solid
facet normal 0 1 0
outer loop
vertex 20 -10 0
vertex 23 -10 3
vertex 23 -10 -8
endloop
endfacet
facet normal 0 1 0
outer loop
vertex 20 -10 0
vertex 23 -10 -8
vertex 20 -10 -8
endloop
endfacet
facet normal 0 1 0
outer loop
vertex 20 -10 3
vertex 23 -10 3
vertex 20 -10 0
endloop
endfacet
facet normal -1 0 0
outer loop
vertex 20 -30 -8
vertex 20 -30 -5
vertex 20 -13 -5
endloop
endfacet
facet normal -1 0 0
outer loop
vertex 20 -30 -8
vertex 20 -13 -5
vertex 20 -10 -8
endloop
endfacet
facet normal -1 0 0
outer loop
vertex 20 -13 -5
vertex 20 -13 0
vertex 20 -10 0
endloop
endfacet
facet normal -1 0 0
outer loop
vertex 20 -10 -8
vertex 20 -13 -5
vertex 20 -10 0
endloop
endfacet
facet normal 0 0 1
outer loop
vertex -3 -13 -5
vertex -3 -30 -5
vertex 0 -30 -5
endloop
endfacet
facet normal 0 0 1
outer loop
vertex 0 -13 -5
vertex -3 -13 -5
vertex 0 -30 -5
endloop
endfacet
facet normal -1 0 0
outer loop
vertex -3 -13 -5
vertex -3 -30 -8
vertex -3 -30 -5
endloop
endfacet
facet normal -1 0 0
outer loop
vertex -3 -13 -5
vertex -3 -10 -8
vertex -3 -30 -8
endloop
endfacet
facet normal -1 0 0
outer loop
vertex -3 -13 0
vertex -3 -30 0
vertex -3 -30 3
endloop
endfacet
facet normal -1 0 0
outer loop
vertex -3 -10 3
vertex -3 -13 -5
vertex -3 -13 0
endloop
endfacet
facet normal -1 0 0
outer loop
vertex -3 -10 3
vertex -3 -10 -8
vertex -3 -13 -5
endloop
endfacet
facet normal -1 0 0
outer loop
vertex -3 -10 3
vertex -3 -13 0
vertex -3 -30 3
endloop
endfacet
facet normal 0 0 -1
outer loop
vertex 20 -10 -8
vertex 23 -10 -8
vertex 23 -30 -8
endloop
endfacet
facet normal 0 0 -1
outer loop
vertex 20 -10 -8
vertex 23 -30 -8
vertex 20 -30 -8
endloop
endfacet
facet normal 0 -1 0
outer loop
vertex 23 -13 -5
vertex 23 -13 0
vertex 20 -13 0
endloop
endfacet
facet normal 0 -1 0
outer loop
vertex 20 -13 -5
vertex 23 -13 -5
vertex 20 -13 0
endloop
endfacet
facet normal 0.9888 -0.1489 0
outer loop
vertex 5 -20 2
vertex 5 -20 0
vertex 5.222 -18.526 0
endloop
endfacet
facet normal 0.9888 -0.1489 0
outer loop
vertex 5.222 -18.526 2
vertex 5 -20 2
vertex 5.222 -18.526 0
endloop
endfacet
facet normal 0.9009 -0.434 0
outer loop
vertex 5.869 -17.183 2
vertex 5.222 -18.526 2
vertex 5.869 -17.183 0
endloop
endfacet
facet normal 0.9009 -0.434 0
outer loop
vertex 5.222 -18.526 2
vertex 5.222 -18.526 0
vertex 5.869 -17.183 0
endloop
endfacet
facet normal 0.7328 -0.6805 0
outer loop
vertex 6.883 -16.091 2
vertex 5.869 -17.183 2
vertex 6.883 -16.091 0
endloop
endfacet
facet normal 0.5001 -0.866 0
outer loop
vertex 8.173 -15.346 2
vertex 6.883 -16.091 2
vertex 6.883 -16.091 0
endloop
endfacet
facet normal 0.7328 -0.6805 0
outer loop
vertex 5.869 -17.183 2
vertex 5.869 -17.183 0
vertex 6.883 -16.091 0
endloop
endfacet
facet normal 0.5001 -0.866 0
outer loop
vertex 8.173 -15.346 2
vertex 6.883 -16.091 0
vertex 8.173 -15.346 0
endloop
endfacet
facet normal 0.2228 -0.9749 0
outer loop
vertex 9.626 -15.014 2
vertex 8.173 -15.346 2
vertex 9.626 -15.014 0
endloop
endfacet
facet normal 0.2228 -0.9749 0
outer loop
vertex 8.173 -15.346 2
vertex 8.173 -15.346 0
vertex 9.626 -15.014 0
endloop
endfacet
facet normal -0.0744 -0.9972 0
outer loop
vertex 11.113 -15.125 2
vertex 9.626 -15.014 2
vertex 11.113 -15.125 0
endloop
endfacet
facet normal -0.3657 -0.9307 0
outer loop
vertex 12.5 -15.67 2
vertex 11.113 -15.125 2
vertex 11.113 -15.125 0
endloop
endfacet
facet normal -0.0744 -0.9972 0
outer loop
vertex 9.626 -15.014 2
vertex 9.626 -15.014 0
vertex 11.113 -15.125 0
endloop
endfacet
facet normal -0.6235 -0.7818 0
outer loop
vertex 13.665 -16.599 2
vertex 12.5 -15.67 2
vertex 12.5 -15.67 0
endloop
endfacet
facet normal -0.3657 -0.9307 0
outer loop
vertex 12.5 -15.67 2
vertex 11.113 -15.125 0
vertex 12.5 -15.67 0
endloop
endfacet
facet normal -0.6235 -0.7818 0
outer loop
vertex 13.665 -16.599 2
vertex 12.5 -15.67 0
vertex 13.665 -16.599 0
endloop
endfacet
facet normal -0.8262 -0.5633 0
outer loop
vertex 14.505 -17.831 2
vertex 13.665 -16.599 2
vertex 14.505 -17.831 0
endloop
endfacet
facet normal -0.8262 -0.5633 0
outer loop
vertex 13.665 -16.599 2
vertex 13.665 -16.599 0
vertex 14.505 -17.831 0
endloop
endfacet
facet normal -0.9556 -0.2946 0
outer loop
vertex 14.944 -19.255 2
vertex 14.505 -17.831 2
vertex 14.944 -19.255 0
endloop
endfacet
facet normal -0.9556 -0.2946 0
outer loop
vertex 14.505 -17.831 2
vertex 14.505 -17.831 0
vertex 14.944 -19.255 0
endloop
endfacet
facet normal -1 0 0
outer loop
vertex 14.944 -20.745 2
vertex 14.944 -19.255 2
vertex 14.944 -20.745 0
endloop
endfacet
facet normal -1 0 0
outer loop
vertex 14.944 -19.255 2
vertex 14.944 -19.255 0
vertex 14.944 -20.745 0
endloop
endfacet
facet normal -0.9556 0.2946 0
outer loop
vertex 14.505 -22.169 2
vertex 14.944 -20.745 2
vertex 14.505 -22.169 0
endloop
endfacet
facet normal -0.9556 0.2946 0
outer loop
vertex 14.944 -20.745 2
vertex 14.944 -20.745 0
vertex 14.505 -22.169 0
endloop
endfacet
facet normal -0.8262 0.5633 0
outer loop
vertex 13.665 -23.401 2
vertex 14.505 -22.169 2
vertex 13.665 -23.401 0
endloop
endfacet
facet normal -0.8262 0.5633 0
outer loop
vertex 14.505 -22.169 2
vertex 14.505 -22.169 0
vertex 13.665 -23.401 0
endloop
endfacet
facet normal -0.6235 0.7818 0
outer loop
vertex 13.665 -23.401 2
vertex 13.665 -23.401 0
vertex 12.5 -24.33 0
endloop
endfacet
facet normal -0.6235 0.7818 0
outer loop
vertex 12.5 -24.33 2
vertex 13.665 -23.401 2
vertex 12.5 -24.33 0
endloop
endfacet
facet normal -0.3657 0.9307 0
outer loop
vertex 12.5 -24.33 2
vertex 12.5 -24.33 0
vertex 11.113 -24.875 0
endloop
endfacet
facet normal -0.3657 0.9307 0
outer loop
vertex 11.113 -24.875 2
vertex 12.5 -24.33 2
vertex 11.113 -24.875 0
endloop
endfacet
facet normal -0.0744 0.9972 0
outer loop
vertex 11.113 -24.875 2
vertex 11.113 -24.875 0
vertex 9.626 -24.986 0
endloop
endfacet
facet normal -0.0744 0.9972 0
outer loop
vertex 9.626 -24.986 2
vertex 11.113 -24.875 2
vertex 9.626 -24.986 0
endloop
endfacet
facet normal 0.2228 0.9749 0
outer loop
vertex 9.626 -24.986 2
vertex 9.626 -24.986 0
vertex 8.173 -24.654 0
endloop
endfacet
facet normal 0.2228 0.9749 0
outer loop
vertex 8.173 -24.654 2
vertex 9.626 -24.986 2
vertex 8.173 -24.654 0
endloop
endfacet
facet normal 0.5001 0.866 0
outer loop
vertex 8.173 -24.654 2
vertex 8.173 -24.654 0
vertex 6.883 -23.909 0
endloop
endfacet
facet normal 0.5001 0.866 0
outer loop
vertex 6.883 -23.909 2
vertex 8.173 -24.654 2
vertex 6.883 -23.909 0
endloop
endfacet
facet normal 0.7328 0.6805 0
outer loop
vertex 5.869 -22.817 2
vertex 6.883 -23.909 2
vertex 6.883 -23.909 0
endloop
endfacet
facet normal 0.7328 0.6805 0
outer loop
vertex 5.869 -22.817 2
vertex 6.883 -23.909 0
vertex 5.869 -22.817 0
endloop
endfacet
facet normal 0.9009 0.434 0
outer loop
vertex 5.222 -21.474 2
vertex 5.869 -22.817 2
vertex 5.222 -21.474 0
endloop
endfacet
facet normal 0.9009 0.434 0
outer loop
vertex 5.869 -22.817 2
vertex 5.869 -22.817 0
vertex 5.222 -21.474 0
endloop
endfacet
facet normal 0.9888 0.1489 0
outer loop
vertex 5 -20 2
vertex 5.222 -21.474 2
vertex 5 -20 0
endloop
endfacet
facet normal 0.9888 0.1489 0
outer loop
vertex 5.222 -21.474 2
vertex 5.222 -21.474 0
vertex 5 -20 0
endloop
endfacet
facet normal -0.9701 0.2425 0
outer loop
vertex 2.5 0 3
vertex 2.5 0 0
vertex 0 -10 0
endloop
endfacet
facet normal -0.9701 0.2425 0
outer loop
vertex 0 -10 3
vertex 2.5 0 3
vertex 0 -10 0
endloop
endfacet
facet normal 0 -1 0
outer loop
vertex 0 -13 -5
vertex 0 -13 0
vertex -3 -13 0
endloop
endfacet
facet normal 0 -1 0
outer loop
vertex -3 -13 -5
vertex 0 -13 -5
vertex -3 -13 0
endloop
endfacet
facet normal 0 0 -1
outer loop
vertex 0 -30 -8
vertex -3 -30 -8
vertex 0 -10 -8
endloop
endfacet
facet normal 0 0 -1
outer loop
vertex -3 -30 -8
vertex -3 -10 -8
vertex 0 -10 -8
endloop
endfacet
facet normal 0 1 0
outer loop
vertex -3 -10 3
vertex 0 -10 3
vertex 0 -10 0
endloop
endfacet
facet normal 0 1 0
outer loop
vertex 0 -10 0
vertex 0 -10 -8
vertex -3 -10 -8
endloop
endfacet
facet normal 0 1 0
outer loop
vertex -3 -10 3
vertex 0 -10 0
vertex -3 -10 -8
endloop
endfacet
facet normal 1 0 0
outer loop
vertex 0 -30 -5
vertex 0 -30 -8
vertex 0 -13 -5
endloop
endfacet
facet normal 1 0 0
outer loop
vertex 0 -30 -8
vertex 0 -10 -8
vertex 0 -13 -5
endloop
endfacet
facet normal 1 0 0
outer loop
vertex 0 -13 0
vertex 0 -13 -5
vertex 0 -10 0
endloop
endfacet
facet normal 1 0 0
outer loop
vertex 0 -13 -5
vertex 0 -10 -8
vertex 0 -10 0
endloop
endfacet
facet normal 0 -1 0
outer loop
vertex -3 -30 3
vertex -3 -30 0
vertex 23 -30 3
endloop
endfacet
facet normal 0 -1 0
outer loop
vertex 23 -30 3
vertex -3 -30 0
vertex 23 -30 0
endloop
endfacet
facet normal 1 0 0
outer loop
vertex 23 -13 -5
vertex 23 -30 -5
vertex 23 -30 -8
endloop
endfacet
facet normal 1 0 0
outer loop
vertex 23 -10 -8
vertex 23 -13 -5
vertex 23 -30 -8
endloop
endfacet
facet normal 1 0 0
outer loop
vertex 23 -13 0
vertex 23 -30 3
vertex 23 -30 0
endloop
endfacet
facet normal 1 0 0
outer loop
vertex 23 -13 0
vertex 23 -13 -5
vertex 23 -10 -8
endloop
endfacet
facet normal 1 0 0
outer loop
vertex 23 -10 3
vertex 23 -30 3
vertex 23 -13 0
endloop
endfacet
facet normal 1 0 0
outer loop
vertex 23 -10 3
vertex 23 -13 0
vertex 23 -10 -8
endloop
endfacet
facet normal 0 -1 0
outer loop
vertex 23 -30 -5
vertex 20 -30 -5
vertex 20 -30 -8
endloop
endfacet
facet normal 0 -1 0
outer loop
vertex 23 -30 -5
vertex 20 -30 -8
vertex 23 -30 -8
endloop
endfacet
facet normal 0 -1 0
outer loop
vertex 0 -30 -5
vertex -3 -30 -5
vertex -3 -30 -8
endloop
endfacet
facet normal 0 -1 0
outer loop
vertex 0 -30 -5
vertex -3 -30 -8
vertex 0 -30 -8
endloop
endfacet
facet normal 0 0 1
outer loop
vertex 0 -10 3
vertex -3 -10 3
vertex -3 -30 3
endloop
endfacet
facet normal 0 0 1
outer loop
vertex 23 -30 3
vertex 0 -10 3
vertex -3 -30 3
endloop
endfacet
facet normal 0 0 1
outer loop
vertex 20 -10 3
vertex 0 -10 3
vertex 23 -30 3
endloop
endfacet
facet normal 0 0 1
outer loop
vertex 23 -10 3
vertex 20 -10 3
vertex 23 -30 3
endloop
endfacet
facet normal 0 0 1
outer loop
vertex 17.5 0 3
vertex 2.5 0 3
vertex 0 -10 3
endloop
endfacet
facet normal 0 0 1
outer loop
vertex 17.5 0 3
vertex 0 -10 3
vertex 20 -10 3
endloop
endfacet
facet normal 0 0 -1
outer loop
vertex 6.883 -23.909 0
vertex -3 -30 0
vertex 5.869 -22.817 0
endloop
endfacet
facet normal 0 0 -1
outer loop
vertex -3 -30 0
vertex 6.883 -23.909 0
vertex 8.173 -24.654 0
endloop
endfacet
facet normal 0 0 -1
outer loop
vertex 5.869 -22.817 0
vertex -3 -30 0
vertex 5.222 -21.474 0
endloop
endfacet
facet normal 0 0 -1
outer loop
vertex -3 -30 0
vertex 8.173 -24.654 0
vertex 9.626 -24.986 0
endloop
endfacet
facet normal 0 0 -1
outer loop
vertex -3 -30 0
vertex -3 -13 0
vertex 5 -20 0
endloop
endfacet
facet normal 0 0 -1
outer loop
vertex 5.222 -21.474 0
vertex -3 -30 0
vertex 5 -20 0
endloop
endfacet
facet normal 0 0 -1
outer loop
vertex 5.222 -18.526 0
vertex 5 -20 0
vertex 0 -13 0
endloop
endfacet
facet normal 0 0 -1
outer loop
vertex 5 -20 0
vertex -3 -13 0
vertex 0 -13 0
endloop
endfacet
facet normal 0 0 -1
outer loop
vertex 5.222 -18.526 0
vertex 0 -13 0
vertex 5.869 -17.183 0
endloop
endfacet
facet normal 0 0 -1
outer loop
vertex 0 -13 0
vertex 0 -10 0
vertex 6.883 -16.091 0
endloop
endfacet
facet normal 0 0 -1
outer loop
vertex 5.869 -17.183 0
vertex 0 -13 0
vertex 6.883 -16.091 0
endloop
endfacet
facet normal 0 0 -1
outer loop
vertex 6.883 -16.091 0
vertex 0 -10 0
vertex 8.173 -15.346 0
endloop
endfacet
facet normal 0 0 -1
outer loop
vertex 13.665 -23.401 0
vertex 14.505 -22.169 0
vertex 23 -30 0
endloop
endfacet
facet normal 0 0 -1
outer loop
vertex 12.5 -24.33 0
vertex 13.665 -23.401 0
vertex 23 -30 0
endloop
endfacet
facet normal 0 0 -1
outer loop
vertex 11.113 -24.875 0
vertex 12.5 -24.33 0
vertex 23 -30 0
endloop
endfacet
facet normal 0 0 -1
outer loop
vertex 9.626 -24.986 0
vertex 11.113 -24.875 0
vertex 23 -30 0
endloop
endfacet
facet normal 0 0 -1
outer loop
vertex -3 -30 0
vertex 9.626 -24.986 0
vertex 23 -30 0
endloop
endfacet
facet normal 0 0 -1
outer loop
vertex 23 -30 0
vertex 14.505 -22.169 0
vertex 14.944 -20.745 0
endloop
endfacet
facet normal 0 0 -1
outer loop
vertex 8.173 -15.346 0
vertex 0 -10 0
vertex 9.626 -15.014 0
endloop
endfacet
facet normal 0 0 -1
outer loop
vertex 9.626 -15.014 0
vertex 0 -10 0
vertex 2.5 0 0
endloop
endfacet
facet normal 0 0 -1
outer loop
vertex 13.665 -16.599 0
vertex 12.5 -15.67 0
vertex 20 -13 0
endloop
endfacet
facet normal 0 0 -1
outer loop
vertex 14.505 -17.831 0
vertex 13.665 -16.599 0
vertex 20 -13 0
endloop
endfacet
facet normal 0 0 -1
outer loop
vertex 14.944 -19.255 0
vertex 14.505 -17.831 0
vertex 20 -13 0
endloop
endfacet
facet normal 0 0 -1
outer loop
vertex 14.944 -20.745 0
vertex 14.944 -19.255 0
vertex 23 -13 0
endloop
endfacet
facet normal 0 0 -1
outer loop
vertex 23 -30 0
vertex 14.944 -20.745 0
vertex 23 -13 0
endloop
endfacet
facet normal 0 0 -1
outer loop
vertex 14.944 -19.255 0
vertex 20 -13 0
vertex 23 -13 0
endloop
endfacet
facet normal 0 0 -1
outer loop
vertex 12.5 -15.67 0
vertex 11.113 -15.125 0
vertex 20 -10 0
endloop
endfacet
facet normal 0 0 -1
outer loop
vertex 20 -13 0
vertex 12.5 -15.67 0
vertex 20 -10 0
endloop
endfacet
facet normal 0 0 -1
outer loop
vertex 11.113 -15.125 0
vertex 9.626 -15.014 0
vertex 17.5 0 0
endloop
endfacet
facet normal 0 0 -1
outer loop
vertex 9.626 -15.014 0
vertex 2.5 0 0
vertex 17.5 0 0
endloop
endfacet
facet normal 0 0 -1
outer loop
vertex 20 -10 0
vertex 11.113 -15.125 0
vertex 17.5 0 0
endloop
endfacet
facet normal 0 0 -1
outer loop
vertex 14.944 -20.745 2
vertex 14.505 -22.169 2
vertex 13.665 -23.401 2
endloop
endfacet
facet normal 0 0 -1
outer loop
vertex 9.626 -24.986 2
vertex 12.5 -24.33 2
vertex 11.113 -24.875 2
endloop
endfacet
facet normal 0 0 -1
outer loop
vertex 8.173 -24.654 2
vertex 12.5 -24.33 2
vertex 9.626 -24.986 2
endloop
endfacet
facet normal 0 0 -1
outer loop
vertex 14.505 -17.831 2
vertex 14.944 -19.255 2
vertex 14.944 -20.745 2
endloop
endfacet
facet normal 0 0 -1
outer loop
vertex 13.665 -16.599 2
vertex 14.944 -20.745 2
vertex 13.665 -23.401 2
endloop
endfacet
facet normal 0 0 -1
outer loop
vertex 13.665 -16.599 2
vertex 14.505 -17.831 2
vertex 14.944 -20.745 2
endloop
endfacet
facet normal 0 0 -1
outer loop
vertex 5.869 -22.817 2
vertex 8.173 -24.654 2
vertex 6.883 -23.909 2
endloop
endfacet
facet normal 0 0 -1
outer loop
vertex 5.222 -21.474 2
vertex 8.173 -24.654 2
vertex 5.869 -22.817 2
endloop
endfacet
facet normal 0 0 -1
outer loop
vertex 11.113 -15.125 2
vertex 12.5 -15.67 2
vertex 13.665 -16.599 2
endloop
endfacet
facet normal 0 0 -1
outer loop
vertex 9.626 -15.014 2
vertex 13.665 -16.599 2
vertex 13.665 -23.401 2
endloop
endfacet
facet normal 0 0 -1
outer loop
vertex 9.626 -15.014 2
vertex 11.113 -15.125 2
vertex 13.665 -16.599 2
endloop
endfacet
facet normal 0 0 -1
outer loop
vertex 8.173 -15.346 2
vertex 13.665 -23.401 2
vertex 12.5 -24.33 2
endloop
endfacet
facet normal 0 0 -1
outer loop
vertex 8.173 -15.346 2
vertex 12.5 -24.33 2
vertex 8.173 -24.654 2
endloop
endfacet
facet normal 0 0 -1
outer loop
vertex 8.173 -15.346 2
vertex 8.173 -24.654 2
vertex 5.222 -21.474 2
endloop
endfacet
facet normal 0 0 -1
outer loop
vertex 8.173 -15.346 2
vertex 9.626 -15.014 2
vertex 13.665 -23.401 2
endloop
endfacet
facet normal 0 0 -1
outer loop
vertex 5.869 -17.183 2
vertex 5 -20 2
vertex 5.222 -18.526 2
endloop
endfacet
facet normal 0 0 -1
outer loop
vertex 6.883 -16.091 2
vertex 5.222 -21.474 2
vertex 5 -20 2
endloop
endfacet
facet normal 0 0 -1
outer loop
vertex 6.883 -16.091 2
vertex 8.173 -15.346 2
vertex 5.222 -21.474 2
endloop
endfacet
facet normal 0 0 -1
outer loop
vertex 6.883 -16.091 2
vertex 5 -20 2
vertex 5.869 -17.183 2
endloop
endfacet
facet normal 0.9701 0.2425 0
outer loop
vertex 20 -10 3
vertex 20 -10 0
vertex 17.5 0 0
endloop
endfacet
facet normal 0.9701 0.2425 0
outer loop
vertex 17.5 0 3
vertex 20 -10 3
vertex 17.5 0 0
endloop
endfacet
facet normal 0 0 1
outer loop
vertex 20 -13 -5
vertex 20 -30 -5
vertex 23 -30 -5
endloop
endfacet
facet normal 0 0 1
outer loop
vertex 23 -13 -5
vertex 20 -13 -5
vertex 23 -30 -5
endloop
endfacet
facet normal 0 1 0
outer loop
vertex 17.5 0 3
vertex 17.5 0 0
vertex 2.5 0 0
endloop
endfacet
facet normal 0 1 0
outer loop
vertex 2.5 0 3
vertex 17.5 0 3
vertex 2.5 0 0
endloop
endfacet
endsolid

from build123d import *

# Parameters (mm, degrees)
EXTRUDE_1_DEPTH     = 3
SKETCH_4_W          = 3
SKETCH_4_H          = 3
EXTRUDE_2_DEPTH     = 8
SKETCH_5_W          = 3
SKETCH_5_H          = 3
EXTRUDE_3_DEPTH     = 17
SKETCH_6_R          = 5
CUT_EXTRUDE_1_DEPTH = 2


with BuildPart() as part:
    # 草图1 → 凸台-拉伸1 (new body)
    with BuildSketch(Plane.XY):
        Polygon((2.5, 0), (0, -10), (-3, -10), (-3, -30), (0, -30), (20, -30), (23, -30), (23, -10), (20, -10), (17.5, 0), align=None)
    extrude(amount=EXTRUDE_1_DEPTH)

    # 草图4 → 凸台-拉伸2 (add)
    with BuildSketch(Plane(origin=(0, 0, 0), x_dir=(-1, 0, 0), z_dir=(0, 0, -1))):
        with Locations((-21.5, -11.5)):
            Rectangle(SKETCH_4_W, SKETCH_4_H)
        with Locations((1.5, -11.5)):
            Rectangle(SKETCH_4_W, SKETCH_4_H)
    extrude(amount=EXTRUDE_2_DEPTH)

    # 草图5 → 凸台-拉伸3 (add)
    with BuildSketch(Plane.XZ.offset(13)):
        with Locations((-1.5, -6.5)):
            Rectangle(SKETCH_5_W, SKETCH_5_H)
        with Locations((21.5, -6.5)):
            Rectangle(SKETCH_5_W, SKETCH_5_H)
    extrude(amount=EXTRUDE_3_DEPTH)

    # 草图6 → 切除-拉伸1 (cut)
    with BuildSketch(Plane(origin=(0, 0, 0), x_dir=(-1, 0, 0), z_dir=(0, 0, -1))):
        with Locations((-10, -20)):
            Circle(SKETCH_6_R)
    extrude(amount=-CUT_EXTRUDE_1_DEPTH, mode=Mode.SUBTRACT)


solid = part.part
